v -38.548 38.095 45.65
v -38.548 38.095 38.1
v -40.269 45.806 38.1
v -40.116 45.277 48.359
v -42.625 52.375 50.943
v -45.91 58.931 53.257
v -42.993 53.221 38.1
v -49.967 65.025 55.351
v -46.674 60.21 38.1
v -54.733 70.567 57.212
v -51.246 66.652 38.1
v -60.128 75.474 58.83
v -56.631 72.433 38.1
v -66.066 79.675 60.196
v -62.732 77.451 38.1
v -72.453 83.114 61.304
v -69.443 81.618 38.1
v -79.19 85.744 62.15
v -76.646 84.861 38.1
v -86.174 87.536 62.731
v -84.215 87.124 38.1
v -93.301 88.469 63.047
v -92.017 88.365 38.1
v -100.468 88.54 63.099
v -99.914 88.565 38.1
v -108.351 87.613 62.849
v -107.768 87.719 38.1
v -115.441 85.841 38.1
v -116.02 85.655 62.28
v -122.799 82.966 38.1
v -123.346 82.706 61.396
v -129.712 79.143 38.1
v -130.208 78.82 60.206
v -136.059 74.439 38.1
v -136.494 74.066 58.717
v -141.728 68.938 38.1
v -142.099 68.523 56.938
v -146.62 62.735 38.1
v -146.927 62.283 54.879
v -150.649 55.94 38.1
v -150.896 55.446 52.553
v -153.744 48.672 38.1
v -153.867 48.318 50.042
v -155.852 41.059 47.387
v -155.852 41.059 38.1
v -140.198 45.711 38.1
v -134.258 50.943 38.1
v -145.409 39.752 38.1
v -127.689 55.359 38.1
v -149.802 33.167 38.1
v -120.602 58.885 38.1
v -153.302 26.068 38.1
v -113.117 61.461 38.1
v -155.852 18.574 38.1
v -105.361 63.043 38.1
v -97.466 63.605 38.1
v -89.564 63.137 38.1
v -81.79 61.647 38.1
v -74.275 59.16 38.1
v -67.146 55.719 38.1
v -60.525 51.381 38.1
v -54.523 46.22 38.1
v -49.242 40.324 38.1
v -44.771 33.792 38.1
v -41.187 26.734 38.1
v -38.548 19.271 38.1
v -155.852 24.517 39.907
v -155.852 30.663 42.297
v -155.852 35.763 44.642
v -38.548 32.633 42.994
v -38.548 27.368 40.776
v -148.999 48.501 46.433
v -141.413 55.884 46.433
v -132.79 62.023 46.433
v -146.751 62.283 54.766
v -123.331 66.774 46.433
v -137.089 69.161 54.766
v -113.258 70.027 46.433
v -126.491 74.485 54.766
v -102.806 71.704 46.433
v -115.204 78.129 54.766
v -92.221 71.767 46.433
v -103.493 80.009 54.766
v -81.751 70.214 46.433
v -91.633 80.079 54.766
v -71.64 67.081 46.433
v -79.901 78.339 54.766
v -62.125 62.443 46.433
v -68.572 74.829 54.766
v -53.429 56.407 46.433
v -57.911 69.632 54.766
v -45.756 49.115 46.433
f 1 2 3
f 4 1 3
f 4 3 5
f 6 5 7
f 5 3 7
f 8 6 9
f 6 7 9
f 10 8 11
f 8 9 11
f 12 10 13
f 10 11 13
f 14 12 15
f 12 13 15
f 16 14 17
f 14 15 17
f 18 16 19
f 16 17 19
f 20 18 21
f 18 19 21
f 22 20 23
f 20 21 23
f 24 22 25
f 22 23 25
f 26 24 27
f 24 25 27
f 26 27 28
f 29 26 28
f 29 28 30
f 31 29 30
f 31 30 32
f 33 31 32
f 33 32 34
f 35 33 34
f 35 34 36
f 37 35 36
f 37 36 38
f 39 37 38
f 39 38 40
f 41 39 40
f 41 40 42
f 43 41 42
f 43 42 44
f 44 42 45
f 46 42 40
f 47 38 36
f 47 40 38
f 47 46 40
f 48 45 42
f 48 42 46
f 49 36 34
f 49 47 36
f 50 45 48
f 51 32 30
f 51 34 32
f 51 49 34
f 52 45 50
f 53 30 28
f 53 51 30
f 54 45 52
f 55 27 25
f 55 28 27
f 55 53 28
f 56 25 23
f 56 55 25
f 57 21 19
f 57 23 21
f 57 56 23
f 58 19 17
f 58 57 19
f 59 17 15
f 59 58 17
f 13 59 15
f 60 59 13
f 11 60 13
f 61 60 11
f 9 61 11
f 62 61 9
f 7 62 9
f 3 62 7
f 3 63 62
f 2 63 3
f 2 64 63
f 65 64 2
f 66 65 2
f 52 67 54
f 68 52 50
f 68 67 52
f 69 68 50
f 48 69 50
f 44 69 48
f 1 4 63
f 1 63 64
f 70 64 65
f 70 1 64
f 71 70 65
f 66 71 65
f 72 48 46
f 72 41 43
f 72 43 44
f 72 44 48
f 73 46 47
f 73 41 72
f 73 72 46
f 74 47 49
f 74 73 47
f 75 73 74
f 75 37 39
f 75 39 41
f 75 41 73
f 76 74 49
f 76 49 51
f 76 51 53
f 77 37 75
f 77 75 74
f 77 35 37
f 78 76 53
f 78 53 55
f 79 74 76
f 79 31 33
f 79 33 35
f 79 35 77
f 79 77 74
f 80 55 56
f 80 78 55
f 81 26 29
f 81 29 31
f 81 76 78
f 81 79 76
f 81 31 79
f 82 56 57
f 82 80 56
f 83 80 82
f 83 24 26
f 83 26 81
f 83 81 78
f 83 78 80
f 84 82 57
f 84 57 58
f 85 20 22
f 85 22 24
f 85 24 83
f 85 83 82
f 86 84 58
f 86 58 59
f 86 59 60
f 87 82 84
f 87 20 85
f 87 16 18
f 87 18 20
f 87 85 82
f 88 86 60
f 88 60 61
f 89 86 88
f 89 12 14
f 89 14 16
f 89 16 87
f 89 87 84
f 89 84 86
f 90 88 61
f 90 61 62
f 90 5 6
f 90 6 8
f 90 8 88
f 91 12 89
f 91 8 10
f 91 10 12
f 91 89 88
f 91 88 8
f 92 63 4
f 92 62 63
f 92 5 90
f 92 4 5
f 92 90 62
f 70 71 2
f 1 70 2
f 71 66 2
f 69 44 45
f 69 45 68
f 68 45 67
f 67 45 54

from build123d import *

# Parameters (mm, degrees)
F0_W        = 206.9673240185
F0_H        = 93.9061716199
F1_DEPTH    = 38.1
F3_DEPTH    = 38.1
F4_DEPTH    = 38.1
F5_T4_ANGLE = 333.9674626616
F6_W        = 206.9673240185
F6_H        = 38.1
F8_DEPTH    = 152.4


# Not quite as in the source:
# - a fillet or chamfer that OpenCascade refuses, or shapes differently, is made with other operations: its cross-section is extruded or revolved along the edge and cut away or added


with BuildPart() as f1:
    # F0 (on Top) → F1 (new body)
    with BuildSketch(Plane.XY):
        with Locations((-103.4836620092, 46.9530858099)):
            Rectangle(F0_W, F0_H)
    extrude(amount=F1_DEPTH)

    # F2 (on face) → F3 (join)
    with BuildSketch(Plane.XY.offset(38.1)):
        with BuildLine():
            Line((-38.5484881699, 19.2711967975), (-38.5484881699, 38.0954556167))
            ThreePointArc((-38.5484881699, 38.0954556167), (-95.9617823939, 88.596121937), (-155.8515280485, 41.0585366189))
            Line((-155.8515280485, 41.0585366189), (-155.8515280485, 19.9683923274))
            ThreePointArc((-155.8515280485, 19.9683923274), (-96.8534760925, 77.9237526804), (-38.5484881699, 19.2711967975))
        make_face()
    extrude(amount=F3_DEPTH)

    # F2 (on face) → F4 (join)
    with BuildSketch(Plane.XY.offset(38.1)):
        with BuildLine():
            ThreePointArc((-155.8515280485, 18.5740012676), (-97.4655811383, 63.6052200178), (-38.5484881699, 19.2711967975))
            ThreePointArc((-38.5484881699, 19.2711967975), (-96.8534760925, 77.9237526804), (-155.8515280485, 19.9683923274))
            Line((-155.8515280485, 19.9683923274), (-155.8515280485, 18.5740012676))
        make_face()
    extrude(amount=F4_DEPTH)

    # F5: chamfer of 38.1 on 1 edges, made by hand


with BuildPart() as f5_tool2:
    # F5_s3 → F5_t4 (revolve)
    with BuildSketch(Plane(origin=(-93.0214210663, 20.9218871248, 0), x_dir=(0, 0, 1), z_dir=(0.9756275706, -0.2194330045, 0))):
        Polygon((38.1, 79.4412595984), (76.2, 117.5412595984), (76.2, 79.4412595984), align=None)
    revolve(axis=Axis((-97.1040055743, 2.7701874098, 76.2), (0, 0, -1)), revolution_arc=F5_T4_ANGLE)

    split(bisect_by=Plane.XY.offset(38.1), keep=Keep.TOP)


with BuildPart() as f1_1:
    add(f1.part)

    # F5_t1: cut F5_tool2
    add(f5_tool2.part, mode=Mode.SUBTRACT)

    # F6 (on face) → F8 (cut)
    with BuildSketch(Plane.XZ):
        with Locations((-103.4836620092, 19.05)):
            Rectangle(F6_W, F6_H)
    extrude(amount=-F8_DEPTH, mode=Mode.SUBTRACT)


solid = f1_1.part
